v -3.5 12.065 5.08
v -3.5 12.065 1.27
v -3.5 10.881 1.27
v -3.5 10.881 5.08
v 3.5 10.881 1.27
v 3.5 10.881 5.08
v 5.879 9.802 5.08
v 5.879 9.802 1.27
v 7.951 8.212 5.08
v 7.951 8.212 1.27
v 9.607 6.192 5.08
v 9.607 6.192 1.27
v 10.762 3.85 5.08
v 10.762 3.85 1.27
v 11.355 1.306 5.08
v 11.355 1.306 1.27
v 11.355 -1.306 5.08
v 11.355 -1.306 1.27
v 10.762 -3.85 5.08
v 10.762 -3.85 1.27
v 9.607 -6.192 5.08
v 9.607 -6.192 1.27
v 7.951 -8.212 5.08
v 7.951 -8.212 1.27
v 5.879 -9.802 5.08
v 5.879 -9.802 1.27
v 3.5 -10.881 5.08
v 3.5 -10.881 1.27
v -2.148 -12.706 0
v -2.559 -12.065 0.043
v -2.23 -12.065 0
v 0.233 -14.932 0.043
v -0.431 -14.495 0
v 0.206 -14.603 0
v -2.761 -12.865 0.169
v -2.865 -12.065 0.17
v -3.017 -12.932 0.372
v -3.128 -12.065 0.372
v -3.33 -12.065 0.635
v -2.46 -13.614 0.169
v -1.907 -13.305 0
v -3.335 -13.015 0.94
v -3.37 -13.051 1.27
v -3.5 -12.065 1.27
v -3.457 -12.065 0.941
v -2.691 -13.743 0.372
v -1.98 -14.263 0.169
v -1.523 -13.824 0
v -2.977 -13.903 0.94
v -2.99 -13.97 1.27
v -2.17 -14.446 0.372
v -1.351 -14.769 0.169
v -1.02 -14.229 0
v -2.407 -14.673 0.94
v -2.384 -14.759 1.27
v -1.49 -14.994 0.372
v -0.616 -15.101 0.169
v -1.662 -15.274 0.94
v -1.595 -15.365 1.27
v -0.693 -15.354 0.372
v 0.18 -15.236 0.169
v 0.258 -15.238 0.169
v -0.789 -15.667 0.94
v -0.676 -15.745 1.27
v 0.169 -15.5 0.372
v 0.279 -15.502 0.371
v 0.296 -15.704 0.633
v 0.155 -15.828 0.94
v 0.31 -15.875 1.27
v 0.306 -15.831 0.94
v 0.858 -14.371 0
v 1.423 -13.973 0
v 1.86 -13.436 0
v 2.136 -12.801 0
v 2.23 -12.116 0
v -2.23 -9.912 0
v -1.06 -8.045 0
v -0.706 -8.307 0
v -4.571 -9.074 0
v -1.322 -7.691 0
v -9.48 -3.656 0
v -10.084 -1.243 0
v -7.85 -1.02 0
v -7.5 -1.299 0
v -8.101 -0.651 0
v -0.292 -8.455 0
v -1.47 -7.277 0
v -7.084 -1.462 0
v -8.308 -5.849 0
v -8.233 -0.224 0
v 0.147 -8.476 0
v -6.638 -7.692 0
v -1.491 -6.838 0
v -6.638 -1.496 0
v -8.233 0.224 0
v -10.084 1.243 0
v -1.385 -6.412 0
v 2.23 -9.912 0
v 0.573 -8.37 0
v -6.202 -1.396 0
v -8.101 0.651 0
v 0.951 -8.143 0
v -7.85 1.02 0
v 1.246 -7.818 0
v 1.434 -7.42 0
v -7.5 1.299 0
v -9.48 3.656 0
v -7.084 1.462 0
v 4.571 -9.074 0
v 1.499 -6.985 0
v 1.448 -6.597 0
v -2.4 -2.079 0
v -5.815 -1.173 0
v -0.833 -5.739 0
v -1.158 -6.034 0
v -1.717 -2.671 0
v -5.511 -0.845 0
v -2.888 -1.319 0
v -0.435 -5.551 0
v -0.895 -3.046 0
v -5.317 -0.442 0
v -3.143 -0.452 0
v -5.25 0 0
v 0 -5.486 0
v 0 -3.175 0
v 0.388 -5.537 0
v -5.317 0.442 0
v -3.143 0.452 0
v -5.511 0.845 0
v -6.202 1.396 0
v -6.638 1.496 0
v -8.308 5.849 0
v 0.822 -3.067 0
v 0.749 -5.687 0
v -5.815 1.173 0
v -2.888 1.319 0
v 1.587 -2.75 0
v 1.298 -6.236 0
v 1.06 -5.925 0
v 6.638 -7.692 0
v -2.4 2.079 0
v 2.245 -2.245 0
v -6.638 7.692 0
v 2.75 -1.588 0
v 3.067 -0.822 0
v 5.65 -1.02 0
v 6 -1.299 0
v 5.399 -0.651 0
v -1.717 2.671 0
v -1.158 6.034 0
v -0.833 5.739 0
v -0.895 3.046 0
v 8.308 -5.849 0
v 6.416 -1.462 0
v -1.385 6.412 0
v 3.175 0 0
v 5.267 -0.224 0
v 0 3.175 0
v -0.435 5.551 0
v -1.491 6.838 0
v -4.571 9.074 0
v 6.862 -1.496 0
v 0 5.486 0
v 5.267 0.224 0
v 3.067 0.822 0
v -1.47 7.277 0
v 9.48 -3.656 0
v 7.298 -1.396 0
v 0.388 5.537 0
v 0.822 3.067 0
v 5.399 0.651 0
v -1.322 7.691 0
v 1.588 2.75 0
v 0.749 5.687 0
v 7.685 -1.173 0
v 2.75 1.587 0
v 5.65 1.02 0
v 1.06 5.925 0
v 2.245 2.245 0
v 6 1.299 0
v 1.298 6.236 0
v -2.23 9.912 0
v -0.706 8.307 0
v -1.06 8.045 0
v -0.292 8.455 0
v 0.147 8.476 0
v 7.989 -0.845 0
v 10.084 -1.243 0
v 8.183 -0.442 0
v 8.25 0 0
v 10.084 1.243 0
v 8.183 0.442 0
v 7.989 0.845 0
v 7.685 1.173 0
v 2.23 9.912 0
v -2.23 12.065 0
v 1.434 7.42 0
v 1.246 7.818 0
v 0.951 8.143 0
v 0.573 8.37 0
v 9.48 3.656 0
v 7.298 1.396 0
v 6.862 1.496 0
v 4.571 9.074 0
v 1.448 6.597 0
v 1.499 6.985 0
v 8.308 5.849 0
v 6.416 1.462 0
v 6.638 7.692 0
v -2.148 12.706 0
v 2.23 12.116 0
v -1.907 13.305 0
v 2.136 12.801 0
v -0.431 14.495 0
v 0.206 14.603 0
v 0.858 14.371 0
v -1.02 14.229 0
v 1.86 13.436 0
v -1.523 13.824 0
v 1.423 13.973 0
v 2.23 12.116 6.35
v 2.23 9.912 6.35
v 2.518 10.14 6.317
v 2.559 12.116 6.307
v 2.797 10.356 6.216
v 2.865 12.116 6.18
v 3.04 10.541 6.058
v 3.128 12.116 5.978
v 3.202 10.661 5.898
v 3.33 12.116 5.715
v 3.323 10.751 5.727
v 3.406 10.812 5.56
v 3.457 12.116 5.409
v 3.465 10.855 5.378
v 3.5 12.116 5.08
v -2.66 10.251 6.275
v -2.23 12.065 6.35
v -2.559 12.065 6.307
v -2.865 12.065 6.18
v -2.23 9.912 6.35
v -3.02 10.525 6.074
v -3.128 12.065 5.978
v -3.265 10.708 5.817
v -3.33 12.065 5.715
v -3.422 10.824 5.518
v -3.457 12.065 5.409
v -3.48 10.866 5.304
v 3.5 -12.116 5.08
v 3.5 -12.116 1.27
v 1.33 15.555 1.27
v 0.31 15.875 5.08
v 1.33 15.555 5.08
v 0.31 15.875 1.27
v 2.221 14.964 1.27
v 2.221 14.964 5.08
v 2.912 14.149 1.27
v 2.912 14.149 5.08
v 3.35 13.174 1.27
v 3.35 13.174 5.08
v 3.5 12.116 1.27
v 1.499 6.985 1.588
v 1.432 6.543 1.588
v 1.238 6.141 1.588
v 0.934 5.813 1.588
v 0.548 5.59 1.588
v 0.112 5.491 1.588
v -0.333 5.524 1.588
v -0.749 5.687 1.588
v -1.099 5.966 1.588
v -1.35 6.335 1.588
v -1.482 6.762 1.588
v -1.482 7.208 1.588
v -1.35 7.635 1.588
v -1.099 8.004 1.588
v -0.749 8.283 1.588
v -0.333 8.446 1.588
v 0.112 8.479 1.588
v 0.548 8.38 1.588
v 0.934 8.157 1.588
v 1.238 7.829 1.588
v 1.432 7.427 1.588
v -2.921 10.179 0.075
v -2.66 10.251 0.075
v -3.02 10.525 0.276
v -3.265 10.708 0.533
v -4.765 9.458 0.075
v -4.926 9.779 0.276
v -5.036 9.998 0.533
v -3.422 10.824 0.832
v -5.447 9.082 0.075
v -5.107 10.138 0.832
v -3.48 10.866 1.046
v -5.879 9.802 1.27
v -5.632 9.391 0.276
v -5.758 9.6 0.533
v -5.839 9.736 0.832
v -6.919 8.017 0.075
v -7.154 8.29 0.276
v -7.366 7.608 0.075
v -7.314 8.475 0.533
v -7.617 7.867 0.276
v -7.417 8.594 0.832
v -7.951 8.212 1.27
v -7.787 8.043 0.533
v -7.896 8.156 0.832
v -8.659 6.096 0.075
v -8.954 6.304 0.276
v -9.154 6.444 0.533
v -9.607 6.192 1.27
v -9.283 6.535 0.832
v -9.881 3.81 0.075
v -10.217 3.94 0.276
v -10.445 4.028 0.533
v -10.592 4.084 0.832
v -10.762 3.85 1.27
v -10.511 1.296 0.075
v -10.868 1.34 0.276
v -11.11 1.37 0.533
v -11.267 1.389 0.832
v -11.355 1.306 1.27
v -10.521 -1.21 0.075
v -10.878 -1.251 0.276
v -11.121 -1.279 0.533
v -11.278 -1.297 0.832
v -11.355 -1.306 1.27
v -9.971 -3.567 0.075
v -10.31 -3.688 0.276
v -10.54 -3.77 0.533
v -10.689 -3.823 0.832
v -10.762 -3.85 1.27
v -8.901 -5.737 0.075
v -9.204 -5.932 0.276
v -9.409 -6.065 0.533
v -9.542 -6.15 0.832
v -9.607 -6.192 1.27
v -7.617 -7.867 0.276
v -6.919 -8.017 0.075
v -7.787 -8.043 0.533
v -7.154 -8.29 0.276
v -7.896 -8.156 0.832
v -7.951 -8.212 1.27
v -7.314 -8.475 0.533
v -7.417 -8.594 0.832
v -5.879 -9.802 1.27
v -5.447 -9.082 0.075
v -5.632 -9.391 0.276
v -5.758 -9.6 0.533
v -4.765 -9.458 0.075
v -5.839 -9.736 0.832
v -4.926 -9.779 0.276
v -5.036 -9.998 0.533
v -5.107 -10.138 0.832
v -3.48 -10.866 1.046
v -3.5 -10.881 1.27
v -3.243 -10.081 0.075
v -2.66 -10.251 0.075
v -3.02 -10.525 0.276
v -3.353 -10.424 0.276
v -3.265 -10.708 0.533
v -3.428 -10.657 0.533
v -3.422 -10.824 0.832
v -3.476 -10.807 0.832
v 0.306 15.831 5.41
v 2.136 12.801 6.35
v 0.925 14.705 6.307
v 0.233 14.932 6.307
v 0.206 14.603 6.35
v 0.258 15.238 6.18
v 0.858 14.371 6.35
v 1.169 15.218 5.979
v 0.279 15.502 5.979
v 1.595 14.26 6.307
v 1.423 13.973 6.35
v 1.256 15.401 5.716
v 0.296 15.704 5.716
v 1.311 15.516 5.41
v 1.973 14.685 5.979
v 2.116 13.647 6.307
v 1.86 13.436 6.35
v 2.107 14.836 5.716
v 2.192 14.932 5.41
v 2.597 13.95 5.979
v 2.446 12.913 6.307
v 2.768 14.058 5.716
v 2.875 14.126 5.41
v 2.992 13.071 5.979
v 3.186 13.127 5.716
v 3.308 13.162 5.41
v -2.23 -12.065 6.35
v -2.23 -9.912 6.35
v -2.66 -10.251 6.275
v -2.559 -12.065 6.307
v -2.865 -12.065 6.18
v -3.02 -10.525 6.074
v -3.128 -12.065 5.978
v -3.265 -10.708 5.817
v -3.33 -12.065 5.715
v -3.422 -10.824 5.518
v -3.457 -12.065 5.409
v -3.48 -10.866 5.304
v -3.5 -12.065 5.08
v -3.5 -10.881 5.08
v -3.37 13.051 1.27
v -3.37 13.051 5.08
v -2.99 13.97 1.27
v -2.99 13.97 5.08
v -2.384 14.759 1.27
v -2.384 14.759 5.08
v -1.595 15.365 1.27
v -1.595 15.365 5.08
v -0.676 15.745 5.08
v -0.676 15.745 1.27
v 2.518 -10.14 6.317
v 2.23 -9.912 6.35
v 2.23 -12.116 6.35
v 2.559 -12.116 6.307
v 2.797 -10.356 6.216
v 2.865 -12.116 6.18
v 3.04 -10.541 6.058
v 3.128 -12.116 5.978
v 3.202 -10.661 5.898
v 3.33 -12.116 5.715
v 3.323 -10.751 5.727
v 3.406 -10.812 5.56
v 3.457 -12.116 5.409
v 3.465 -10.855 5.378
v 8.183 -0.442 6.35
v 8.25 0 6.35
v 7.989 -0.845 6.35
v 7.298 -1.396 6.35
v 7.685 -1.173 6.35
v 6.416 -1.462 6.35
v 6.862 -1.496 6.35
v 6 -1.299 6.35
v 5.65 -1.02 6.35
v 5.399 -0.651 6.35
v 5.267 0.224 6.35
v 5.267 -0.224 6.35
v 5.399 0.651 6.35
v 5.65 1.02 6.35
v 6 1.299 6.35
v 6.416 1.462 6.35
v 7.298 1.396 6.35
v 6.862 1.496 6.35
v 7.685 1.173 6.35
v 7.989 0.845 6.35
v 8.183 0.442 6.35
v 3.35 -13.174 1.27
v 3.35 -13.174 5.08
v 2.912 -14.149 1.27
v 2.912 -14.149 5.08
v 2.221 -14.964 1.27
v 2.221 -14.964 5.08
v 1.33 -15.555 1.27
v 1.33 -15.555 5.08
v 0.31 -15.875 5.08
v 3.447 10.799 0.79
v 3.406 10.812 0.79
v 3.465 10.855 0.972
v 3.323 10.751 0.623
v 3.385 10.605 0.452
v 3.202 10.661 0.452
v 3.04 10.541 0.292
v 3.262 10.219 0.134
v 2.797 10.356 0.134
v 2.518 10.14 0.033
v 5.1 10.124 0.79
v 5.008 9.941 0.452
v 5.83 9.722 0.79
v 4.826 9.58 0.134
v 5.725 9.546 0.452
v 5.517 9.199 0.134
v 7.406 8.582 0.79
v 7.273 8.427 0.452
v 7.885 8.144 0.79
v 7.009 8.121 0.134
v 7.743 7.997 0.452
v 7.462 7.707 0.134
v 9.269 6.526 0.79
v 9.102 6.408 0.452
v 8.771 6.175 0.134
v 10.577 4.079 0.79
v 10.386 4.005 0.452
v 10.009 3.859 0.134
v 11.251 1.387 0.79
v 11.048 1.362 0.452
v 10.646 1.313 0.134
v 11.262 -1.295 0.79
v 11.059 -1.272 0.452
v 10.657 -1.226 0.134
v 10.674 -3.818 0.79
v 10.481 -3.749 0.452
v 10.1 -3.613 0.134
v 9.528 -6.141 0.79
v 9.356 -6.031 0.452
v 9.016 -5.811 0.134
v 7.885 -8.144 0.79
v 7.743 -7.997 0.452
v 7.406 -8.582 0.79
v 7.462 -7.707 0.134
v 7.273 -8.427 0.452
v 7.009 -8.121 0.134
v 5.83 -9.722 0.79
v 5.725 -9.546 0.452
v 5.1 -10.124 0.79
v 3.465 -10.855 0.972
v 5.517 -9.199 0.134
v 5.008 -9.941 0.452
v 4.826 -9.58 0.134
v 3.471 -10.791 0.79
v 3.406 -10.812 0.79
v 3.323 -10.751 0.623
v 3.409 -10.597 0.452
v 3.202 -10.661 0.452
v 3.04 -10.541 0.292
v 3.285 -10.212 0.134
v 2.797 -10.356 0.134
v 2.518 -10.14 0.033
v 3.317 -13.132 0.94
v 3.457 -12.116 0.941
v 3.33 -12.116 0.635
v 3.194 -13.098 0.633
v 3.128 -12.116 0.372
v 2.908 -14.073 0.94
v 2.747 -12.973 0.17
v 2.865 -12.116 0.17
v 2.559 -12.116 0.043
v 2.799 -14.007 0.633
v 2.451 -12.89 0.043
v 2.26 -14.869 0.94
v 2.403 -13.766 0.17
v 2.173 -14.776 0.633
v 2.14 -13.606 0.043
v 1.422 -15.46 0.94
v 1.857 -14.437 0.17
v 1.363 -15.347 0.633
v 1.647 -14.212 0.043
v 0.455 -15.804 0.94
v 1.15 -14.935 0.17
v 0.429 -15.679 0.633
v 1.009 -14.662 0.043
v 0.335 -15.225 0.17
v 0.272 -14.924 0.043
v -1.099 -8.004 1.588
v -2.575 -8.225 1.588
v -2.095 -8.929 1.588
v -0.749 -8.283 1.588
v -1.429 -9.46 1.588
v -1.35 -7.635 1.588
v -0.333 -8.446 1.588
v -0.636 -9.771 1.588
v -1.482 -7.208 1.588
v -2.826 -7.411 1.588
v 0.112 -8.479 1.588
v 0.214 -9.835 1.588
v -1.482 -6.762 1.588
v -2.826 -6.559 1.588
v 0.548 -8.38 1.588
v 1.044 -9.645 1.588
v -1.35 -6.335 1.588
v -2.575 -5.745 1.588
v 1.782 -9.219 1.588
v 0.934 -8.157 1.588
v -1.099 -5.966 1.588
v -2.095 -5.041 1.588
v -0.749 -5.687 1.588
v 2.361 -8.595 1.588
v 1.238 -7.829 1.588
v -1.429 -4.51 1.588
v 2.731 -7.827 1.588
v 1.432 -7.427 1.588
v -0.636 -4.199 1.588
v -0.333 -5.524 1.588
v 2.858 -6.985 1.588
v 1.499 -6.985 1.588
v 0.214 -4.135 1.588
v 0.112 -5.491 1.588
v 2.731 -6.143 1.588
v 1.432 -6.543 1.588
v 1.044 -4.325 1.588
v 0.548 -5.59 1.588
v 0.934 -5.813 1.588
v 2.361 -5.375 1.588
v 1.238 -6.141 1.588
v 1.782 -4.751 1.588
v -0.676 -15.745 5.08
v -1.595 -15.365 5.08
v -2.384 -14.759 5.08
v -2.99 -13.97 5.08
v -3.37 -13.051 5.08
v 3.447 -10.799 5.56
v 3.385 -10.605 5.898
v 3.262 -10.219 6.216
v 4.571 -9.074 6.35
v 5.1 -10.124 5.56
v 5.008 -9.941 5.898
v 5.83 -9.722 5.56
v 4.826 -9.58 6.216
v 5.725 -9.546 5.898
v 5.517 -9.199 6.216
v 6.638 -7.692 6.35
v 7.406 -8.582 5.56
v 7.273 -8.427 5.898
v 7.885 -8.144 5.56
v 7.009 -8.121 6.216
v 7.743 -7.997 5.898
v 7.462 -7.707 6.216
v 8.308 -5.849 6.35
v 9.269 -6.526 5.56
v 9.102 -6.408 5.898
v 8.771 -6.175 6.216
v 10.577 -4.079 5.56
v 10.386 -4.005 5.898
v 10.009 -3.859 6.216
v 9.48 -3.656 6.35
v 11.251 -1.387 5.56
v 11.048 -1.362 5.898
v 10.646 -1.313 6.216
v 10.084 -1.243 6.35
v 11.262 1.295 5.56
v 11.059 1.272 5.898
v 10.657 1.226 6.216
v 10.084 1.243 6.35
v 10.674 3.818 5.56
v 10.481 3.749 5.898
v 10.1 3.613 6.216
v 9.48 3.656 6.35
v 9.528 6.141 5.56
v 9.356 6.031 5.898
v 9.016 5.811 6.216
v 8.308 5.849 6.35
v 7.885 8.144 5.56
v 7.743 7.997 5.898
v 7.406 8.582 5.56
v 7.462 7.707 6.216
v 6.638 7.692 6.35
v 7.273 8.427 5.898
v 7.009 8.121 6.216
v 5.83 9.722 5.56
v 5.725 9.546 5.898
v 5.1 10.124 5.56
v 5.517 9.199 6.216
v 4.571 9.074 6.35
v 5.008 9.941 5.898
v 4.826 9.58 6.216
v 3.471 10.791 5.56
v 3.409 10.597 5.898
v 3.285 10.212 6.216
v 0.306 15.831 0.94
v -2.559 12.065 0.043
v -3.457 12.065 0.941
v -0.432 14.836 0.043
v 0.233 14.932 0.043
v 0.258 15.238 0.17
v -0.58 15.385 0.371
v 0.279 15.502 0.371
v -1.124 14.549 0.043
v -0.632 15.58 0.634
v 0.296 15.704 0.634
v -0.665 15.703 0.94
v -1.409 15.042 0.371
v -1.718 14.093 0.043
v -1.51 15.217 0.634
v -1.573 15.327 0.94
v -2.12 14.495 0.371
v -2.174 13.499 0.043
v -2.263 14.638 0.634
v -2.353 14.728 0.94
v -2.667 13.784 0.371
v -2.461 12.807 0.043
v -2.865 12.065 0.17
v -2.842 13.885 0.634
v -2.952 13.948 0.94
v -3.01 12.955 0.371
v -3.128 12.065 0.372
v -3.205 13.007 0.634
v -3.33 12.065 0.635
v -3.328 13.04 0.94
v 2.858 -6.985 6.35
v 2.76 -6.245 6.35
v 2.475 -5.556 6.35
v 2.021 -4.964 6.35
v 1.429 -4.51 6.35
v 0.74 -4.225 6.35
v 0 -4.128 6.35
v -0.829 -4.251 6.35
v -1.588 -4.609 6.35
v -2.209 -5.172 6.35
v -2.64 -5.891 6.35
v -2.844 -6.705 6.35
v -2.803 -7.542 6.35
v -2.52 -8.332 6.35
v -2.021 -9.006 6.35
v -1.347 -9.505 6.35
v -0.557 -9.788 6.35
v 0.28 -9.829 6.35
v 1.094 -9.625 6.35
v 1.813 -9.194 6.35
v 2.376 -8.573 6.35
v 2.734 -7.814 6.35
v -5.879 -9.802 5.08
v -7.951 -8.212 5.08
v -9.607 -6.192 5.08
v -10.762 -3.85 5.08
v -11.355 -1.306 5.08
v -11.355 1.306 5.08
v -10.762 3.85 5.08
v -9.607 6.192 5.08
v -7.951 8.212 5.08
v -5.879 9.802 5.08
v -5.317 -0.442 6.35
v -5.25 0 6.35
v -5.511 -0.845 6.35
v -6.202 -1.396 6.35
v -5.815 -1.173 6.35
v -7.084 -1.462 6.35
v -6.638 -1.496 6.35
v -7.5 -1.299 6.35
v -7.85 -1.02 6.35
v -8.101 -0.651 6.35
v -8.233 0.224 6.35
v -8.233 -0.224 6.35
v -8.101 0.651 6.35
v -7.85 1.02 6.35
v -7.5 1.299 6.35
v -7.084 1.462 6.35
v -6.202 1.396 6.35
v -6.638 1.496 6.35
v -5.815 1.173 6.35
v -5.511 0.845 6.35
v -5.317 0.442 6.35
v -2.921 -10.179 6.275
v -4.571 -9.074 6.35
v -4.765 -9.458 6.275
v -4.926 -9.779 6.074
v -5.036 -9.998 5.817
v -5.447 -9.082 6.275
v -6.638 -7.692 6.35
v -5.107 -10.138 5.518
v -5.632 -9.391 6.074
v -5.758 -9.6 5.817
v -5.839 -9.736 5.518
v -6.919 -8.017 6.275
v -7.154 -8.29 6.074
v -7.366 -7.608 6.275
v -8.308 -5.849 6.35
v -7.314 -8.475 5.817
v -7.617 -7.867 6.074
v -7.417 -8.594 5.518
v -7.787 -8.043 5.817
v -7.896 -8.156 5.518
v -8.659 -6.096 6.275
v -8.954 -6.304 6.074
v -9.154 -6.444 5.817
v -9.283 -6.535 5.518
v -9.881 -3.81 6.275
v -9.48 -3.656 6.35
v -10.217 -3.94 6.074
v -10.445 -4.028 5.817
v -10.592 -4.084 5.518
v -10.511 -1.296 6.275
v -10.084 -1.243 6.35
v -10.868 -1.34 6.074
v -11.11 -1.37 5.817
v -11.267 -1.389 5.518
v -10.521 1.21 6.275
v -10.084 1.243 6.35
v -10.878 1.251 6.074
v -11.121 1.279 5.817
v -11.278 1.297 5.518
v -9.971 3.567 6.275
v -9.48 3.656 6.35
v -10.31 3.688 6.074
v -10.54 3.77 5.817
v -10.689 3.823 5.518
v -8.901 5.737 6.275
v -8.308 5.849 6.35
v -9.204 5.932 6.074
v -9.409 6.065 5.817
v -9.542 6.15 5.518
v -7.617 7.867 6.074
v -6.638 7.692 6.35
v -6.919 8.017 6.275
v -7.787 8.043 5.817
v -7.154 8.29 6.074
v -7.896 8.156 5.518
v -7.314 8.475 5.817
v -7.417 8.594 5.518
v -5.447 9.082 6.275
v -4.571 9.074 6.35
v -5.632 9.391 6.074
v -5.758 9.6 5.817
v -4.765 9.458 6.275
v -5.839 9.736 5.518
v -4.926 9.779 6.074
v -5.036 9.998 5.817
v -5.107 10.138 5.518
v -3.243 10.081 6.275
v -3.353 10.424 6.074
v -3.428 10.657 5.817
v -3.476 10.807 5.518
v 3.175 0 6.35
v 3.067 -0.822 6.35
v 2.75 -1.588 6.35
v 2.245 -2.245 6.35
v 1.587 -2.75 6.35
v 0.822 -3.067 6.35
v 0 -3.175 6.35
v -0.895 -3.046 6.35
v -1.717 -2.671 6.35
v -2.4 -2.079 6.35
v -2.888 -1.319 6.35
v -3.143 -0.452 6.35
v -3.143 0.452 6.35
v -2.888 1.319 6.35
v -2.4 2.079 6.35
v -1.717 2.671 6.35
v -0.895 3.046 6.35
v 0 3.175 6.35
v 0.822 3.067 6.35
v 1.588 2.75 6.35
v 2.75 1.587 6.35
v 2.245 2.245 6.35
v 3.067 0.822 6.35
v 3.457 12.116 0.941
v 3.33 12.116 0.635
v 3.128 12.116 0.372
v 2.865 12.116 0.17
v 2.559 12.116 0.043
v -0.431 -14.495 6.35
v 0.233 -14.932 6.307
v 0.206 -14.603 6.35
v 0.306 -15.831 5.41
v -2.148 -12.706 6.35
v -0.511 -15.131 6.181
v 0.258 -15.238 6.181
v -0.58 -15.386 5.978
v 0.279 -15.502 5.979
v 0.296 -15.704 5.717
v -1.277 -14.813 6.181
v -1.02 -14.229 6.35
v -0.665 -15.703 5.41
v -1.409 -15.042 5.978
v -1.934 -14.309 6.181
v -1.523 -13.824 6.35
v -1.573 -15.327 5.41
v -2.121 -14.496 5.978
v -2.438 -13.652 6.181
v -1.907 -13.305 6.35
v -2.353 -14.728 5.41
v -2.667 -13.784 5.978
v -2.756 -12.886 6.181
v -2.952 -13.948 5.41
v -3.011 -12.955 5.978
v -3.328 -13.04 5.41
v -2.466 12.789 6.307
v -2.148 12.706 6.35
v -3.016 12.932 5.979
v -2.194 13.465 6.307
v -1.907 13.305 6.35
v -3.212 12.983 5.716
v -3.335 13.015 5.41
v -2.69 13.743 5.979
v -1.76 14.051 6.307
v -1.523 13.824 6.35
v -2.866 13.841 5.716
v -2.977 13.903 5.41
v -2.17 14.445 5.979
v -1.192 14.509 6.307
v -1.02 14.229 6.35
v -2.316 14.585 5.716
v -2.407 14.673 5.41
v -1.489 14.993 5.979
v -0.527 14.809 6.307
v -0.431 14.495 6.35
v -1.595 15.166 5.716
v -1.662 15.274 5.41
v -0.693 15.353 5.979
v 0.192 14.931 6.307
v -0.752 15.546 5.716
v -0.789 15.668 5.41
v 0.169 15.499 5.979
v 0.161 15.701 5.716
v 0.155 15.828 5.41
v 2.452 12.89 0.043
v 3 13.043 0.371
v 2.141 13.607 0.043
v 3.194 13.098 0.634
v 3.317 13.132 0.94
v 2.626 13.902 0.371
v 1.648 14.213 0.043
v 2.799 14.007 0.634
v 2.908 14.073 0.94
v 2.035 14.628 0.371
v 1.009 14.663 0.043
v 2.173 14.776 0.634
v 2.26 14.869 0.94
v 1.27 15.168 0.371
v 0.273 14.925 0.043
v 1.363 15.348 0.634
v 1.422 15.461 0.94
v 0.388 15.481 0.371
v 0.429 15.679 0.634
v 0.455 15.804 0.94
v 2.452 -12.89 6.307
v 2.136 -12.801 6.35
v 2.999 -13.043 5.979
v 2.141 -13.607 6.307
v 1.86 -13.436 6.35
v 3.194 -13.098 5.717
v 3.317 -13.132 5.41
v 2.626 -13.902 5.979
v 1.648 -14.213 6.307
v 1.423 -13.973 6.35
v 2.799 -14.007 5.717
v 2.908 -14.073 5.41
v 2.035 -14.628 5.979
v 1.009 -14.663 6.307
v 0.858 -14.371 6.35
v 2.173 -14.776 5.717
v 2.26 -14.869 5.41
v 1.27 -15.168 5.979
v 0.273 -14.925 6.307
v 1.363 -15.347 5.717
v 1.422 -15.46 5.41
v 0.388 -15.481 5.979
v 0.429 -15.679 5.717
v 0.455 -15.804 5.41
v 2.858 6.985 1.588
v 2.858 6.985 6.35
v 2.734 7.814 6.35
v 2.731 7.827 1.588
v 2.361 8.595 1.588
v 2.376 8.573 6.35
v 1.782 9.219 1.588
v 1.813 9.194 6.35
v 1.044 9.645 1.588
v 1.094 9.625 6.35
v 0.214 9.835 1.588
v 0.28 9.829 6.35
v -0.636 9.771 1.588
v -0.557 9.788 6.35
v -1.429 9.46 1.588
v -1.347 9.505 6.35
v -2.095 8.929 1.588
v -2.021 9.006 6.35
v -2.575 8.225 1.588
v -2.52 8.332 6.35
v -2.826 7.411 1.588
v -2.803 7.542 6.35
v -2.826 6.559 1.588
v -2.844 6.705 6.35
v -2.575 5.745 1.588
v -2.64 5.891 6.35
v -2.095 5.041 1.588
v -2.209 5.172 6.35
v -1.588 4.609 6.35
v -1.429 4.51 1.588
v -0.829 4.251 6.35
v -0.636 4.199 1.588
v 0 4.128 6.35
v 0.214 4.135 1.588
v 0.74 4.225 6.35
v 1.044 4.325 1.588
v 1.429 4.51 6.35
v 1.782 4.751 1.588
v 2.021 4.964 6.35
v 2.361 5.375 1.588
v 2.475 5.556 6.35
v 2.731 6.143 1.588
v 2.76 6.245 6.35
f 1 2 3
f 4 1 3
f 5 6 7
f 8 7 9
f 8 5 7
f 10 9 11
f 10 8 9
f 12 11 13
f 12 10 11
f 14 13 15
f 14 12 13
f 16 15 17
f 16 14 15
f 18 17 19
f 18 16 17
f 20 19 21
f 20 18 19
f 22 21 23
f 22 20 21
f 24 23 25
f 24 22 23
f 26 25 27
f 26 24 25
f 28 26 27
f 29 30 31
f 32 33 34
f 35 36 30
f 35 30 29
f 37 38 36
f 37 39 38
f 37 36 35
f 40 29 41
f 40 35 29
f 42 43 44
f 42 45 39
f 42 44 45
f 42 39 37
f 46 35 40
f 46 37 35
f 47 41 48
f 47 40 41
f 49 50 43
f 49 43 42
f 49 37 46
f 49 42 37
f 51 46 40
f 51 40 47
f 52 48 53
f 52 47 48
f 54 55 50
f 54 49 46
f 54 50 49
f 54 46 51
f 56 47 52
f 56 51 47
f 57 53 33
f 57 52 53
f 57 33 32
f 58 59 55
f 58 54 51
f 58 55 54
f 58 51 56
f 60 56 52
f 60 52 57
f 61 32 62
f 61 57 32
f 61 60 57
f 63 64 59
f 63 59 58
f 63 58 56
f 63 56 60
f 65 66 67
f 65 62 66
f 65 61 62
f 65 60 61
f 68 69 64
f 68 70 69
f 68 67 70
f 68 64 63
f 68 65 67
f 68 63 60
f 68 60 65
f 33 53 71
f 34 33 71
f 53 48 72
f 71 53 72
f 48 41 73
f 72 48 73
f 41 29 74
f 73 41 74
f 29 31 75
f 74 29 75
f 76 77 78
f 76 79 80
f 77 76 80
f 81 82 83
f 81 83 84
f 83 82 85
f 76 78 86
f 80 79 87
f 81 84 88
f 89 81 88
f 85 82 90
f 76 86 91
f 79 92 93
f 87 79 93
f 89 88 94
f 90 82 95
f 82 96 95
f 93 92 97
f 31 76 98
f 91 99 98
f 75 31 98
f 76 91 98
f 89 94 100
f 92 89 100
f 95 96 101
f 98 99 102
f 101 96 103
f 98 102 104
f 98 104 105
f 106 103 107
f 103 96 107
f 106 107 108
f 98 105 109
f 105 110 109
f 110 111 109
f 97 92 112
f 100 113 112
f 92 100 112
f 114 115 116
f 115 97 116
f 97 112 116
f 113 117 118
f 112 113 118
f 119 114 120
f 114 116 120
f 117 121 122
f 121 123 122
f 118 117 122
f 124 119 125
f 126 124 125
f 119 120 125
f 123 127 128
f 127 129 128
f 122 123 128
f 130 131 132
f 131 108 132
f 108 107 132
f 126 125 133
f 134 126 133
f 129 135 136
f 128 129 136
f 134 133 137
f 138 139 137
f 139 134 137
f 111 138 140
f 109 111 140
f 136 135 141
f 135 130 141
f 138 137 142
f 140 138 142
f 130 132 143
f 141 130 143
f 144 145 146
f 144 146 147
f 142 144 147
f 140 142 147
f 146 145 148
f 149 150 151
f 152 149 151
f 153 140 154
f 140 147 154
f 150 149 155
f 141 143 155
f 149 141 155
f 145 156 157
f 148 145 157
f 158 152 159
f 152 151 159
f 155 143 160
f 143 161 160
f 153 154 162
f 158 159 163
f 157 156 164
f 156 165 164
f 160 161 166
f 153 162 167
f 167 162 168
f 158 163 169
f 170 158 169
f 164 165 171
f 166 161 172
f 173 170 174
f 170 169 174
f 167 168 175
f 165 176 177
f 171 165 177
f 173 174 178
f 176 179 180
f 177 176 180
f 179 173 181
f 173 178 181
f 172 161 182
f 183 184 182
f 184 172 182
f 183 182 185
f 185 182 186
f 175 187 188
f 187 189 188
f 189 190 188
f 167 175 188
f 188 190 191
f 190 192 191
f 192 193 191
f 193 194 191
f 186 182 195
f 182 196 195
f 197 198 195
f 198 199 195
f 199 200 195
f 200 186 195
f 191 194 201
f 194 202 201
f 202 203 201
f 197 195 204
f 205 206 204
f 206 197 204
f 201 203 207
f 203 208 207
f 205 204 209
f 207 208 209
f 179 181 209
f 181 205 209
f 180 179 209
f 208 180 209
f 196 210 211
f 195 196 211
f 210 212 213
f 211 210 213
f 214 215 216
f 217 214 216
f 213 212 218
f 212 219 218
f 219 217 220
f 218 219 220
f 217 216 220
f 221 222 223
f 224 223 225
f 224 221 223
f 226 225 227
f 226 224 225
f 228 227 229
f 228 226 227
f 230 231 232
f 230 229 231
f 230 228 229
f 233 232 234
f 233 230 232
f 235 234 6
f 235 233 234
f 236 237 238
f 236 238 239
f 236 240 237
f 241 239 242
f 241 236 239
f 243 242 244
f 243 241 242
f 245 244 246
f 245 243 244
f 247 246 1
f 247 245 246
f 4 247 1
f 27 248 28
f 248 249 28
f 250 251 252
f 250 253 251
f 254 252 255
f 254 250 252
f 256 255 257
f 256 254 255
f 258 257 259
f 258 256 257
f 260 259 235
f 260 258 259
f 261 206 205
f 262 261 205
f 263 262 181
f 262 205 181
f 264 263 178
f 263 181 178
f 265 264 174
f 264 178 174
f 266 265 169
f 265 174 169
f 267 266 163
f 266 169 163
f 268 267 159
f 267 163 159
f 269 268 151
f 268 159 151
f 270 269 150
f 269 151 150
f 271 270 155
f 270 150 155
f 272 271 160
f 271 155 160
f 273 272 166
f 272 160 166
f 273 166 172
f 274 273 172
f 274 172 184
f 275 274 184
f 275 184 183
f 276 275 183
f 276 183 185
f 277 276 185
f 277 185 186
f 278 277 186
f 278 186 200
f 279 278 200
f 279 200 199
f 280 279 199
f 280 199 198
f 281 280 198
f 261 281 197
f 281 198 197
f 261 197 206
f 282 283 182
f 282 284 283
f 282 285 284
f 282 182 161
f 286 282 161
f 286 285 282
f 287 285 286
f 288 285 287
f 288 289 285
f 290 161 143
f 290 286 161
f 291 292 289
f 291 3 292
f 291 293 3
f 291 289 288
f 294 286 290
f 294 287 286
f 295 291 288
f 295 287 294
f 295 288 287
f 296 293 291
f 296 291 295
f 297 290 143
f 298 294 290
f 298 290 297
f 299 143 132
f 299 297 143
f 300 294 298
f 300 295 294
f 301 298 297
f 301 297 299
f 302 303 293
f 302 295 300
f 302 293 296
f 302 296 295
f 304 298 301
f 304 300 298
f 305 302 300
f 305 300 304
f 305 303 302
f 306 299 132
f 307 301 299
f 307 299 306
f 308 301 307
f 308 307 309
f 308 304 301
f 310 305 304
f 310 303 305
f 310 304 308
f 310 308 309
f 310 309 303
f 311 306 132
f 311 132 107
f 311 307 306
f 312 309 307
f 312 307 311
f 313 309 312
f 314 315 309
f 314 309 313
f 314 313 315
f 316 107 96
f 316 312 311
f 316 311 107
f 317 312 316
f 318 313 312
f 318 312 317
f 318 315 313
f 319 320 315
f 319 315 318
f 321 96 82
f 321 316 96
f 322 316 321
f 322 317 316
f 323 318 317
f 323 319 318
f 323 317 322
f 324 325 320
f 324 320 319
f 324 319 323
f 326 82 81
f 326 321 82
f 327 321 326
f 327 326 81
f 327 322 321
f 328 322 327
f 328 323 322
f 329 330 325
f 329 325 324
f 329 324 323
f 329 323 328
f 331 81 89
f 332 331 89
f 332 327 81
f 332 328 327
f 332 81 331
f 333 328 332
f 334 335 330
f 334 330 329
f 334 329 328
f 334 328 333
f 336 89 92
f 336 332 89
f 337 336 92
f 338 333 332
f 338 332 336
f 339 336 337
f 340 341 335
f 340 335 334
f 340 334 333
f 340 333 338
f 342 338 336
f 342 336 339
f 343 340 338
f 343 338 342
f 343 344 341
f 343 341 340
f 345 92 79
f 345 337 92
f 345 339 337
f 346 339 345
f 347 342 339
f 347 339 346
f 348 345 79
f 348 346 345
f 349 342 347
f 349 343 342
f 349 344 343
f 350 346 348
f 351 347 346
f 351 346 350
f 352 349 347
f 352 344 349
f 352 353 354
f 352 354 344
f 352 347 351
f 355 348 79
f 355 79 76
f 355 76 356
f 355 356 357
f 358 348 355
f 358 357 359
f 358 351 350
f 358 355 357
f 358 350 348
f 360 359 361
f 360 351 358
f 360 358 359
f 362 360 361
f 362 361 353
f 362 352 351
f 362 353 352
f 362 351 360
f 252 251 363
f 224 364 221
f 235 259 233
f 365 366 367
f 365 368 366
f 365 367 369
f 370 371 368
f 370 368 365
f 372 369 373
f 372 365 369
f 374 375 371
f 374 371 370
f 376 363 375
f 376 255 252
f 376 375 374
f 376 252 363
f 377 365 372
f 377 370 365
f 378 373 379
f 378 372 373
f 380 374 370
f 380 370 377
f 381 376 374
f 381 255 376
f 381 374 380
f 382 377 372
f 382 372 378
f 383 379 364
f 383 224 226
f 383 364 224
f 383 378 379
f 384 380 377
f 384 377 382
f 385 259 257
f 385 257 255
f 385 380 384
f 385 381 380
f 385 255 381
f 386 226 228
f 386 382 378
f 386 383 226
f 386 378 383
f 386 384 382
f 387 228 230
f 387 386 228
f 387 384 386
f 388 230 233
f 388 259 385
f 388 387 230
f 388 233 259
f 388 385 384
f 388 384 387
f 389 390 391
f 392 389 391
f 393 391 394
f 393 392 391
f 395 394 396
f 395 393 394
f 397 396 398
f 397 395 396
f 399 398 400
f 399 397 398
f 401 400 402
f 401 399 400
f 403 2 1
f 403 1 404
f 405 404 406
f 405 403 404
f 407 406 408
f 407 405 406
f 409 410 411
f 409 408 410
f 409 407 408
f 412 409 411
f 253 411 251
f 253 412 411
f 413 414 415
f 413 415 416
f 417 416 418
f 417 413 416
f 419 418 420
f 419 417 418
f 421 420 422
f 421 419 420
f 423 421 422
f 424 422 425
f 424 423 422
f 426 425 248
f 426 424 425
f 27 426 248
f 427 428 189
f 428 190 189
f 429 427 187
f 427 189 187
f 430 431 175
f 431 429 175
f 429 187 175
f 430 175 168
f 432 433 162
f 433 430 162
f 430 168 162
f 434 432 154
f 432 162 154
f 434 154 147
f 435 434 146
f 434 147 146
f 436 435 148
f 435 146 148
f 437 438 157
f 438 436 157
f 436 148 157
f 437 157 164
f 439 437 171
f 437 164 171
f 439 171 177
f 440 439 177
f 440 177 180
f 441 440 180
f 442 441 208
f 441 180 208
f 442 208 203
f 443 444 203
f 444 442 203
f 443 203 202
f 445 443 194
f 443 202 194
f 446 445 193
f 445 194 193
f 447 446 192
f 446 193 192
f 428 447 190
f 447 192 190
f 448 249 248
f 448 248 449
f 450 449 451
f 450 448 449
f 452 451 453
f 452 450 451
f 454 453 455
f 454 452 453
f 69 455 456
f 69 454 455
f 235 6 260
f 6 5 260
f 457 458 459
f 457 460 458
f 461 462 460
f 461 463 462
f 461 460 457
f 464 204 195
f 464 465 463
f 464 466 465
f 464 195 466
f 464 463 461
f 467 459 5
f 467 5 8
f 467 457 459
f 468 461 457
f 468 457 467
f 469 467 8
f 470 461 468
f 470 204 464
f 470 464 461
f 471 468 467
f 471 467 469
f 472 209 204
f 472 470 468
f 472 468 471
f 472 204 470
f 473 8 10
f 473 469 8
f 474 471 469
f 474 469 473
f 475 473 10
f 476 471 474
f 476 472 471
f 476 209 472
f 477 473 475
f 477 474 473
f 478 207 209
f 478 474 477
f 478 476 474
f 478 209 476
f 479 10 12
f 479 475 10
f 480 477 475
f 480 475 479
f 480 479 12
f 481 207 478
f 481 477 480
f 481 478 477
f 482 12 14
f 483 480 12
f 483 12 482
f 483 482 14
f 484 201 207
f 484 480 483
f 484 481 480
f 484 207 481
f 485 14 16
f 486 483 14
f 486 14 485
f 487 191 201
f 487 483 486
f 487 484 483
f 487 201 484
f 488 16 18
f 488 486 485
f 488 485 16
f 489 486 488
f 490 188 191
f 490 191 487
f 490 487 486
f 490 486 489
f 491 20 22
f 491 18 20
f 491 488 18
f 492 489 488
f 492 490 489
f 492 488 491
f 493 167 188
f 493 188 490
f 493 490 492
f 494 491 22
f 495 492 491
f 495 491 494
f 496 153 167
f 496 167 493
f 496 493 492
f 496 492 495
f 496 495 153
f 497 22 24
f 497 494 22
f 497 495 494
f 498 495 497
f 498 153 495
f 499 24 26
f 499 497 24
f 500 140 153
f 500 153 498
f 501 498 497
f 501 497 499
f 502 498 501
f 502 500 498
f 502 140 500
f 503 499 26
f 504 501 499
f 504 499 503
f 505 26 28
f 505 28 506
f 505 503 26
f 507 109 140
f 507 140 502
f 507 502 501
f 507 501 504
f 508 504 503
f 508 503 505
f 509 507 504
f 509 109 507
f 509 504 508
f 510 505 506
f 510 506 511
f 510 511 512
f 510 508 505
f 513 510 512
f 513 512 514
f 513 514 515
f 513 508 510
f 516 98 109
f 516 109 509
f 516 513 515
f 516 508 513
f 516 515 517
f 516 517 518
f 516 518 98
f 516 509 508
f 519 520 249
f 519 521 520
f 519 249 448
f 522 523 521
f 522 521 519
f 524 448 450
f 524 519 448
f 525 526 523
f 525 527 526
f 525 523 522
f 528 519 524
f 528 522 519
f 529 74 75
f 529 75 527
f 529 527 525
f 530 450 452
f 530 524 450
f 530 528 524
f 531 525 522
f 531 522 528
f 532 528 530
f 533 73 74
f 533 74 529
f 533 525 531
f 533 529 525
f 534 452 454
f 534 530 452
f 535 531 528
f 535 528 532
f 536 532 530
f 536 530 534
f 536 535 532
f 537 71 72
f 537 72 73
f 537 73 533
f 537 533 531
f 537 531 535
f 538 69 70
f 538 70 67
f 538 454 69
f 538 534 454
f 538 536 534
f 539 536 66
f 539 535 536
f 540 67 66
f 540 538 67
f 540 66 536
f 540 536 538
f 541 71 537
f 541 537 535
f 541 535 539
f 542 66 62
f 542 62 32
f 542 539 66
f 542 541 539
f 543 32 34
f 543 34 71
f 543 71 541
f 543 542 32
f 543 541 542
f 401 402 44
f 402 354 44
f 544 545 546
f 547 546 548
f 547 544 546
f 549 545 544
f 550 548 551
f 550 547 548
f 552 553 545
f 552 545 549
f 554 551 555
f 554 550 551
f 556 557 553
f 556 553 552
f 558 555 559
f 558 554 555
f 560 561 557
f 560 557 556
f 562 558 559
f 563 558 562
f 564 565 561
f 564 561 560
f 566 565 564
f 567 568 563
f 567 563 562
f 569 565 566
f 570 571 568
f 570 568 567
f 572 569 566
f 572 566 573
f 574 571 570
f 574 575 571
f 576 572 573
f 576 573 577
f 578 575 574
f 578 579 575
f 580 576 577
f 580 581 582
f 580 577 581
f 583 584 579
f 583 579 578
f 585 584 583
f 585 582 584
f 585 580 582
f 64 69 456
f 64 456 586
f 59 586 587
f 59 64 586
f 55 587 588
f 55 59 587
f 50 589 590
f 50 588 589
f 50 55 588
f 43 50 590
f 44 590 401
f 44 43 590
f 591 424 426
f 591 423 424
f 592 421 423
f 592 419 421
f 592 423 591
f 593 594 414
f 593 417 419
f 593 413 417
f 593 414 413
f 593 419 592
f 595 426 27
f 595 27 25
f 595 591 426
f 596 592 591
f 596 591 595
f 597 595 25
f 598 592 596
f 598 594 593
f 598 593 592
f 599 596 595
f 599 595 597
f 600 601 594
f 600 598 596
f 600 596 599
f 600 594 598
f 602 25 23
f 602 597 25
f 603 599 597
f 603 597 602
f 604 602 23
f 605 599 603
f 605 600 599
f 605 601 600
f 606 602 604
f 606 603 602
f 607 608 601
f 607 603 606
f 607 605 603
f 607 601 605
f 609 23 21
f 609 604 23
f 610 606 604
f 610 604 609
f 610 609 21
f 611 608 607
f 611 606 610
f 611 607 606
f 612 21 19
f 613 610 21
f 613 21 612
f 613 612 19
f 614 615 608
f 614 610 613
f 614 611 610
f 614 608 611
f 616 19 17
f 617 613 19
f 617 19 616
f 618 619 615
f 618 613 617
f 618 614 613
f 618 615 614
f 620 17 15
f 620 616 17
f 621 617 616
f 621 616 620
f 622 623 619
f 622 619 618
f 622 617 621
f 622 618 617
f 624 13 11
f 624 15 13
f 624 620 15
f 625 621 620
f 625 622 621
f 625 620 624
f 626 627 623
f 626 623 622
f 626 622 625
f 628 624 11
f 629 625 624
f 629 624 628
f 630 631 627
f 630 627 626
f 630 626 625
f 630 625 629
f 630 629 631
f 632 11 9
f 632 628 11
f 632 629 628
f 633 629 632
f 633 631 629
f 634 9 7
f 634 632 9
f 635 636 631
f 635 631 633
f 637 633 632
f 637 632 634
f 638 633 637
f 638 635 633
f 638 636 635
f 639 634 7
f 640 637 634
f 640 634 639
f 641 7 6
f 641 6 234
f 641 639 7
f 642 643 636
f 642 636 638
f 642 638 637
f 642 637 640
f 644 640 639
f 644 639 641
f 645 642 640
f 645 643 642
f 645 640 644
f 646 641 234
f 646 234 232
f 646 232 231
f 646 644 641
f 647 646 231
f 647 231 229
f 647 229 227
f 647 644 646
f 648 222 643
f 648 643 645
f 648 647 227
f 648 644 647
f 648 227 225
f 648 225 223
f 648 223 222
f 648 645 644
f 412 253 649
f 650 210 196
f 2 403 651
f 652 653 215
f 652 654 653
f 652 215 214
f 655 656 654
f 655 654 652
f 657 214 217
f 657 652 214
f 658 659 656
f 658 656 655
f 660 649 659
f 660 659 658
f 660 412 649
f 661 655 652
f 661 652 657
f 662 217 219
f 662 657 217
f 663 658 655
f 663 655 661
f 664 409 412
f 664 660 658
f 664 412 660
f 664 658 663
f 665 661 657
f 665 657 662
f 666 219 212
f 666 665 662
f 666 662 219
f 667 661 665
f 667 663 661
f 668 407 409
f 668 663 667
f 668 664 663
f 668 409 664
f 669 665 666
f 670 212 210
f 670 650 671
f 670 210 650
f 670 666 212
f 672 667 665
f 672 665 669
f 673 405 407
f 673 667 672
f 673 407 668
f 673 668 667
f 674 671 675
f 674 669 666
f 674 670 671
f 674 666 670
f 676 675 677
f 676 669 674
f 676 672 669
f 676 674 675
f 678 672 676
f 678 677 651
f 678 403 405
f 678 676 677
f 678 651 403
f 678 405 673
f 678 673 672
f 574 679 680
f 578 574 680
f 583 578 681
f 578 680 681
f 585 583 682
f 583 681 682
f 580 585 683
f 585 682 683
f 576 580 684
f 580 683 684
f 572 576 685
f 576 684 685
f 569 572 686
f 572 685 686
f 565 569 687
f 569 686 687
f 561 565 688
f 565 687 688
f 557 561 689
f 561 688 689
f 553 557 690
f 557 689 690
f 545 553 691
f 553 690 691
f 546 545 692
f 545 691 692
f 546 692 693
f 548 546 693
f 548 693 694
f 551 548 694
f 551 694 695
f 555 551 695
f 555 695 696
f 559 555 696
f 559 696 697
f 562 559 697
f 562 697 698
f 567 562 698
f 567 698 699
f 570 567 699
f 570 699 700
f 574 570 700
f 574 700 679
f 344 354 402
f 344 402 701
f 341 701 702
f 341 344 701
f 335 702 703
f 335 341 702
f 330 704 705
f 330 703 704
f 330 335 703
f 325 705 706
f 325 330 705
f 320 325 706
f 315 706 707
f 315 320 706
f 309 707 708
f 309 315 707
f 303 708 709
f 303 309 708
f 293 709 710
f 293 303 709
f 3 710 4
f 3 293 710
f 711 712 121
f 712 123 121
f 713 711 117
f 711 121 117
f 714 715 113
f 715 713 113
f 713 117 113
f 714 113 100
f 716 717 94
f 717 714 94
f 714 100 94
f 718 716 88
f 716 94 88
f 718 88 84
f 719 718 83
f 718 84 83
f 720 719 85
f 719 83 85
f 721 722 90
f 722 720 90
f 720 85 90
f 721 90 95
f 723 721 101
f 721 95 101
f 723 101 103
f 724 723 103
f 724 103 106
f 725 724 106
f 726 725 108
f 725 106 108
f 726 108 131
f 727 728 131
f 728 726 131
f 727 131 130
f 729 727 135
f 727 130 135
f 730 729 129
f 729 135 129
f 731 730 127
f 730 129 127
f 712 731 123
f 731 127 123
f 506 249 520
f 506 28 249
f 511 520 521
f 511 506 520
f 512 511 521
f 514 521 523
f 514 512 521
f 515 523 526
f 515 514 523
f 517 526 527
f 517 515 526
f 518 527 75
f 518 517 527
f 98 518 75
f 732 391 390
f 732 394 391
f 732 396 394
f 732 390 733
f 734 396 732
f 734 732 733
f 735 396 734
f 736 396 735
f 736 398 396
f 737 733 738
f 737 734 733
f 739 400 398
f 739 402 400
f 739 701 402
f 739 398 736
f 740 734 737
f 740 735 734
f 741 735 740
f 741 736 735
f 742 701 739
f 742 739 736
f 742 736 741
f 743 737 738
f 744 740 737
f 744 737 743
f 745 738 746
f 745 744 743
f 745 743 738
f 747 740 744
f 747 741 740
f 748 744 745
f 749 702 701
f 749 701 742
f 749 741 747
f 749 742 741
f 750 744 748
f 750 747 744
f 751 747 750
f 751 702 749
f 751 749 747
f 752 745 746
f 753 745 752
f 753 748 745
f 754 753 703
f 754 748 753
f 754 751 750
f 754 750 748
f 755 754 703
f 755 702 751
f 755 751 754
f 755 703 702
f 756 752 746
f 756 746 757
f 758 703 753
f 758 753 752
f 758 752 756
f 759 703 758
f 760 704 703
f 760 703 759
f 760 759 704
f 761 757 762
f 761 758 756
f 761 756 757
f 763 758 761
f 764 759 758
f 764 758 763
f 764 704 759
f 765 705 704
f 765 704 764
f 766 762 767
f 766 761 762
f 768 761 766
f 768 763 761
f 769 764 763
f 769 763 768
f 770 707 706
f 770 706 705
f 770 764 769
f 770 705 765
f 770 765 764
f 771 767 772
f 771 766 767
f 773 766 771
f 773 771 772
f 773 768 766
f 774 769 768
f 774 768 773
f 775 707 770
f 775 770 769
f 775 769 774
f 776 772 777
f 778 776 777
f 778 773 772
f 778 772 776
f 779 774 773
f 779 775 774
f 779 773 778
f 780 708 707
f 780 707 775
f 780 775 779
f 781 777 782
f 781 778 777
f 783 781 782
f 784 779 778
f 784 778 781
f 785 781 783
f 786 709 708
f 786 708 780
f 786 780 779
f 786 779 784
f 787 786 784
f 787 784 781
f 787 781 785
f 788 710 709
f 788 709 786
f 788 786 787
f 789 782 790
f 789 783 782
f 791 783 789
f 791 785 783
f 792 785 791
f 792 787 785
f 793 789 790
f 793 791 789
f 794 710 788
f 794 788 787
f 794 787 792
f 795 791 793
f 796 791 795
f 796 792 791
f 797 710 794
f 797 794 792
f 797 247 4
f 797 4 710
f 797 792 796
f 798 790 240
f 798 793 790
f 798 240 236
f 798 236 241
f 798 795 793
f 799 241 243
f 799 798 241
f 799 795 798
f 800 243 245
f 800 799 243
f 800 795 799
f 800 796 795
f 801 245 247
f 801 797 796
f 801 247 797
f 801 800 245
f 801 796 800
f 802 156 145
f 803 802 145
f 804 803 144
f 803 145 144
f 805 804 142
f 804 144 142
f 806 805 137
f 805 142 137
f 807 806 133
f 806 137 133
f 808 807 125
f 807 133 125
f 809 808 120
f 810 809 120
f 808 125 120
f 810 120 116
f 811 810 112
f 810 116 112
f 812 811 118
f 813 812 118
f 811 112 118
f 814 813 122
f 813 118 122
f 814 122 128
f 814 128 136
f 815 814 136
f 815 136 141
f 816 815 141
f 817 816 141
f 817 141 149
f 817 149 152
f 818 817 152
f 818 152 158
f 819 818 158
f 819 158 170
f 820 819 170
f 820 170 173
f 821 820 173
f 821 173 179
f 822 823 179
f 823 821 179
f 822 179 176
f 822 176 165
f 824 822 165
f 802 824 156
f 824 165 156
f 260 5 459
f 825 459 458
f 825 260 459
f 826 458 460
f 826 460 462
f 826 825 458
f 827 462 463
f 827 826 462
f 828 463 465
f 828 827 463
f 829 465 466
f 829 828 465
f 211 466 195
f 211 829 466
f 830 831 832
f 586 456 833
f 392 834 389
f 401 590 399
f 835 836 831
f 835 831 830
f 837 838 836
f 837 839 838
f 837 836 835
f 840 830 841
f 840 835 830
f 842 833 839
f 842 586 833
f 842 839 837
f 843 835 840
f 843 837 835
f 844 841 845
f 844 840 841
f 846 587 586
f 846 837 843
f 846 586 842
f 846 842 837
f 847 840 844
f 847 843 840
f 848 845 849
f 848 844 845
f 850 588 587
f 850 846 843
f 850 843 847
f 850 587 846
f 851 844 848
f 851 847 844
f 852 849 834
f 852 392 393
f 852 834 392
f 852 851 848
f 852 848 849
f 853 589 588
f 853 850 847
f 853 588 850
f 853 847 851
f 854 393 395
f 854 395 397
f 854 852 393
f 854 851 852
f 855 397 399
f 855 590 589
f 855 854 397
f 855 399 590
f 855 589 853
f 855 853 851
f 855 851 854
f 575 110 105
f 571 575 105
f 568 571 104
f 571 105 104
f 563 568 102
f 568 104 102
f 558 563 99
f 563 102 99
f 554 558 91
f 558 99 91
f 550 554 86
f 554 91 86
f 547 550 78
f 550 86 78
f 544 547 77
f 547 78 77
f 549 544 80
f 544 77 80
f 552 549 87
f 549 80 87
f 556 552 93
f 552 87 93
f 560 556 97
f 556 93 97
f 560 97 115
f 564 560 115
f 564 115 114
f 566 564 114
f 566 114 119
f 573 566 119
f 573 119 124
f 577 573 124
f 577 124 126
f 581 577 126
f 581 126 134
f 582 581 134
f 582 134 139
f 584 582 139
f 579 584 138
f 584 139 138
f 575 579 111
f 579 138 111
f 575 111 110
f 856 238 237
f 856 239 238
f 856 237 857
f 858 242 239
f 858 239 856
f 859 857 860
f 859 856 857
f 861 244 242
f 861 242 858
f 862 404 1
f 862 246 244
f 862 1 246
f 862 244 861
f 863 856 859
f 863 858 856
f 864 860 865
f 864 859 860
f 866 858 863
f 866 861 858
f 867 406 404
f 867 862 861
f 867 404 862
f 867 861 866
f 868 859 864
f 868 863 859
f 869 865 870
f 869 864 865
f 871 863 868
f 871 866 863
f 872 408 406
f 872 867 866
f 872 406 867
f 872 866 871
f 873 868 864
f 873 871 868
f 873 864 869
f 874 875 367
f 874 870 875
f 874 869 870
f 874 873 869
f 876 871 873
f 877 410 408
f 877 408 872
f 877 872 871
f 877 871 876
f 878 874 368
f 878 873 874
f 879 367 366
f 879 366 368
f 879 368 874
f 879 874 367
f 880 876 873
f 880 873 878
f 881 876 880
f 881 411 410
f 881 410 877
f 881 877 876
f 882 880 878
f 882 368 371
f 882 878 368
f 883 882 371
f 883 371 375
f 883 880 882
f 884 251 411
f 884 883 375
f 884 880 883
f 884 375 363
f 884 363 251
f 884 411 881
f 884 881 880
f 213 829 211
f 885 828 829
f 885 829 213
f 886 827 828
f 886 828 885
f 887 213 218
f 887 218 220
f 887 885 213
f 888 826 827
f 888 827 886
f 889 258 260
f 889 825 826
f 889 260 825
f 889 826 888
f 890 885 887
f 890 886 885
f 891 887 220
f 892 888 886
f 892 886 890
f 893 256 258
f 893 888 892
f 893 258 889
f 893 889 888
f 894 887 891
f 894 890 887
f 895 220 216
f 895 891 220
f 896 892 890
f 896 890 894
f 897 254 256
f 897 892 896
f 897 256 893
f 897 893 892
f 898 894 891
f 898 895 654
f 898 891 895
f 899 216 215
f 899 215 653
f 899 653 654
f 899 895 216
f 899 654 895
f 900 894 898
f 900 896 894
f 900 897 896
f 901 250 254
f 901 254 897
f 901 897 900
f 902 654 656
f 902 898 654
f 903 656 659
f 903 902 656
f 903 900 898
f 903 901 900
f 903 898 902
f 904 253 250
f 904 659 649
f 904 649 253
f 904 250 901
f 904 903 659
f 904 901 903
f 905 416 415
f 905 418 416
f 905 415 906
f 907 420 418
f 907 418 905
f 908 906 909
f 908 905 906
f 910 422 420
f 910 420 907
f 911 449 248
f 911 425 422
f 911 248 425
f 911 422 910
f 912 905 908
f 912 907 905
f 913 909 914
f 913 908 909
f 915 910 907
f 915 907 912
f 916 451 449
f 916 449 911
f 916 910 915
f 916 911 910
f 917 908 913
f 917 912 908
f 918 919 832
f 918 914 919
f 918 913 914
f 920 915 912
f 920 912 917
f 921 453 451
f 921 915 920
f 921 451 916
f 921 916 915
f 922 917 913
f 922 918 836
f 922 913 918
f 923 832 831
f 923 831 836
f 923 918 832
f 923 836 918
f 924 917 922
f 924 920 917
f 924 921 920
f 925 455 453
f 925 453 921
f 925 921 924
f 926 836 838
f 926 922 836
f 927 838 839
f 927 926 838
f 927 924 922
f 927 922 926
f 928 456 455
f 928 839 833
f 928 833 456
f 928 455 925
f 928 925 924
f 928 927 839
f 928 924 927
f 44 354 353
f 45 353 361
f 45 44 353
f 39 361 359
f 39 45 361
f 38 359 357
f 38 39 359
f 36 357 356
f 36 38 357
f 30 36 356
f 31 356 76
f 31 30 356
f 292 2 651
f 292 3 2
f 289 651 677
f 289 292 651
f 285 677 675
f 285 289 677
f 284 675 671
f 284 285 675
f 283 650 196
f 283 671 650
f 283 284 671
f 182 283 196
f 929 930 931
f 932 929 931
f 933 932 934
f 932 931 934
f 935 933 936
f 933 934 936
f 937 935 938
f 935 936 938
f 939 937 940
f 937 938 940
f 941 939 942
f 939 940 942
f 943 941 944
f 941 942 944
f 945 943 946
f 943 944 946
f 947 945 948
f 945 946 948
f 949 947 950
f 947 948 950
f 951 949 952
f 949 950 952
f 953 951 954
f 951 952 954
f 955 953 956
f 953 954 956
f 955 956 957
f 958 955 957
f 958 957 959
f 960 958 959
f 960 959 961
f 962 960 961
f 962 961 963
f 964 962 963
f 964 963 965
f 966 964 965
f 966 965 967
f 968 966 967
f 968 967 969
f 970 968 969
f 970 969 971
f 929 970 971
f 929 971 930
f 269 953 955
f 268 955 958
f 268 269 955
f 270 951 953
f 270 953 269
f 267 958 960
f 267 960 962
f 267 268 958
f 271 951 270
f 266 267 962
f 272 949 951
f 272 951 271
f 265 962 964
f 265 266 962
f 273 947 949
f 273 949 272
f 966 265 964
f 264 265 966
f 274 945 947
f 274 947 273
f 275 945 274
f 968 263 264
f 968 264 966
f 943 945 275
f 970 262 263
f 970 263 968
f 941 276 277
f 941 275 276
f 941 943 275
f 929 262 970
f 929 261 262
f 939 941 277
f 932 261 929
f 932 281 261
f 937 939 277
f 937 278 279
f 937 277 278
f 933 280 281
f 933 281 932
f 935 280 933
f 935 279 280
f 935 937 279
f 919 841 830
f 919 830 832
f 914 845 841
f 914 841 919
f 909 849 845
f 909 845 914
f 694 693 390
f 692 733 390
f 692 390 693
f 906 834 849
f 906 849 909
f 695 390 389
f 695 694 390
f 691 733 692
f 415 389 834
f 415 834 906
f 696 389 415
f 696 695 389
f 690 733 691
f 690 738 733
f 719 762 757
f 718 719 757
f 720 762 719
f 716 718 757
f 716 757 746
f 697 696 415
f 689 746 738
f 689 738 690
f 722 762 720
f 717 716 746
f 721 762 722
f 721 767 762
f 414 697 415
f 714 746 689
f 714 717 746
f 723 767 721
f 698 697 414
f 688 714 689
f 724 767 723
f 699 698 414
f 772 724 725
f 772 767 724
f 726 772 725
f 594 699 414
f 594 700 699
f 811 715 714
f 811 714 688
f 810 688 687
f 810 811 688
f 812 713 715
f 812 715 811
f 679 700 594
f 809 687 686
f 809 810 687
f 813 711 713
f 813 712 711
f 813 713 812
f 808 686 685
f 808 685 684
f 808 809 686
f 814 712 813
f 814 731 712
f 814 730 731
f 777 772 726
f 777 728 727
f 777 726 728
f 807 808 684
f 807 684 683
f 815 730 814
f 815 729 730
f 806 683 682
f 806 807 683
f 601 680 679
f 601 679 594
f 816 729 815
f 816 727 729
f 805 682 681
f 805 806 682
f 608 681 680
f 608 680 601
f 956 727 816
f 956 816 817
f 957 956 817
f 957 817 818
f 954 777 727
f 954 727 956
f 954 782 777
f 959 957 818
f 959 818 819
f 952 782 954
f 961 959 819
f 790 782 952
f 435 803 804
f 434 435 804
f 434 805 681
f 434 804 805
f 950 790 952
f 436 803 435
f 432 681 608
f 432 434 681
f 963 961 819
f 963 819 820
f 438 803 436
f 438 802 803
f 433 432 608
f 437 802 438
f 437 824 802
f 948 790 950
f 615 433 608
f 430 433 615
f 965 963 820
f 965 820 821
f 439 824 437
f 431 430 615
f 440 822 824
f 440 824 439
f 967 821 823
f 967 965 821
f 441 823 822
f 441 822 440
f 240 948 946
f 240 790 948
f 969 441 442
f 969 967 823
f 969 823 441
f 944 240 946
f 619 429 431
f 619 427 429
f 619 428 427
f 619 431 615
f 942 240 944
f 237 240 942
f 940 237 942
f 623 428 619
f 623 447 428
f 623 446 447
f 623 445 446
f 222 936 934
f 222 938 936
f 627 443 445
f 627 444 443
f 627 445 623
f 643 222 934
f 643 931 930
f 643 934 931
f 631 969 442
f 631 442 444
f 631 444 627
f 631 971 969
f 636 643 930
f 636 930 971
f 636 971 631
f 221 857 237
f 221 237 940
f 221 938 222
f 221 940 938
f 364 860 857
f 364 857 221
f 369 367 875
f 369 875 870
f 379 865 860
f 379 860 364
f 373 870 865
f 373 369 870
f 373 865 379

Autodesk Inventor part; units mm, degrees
ref_plane "YZ Plane" through (0, 0, 0) normal (1, 0, 0) x (0, 1, 0)
ref_plane "XZ Plane" through (0, 0, 0) normal (0, 1, 0) x (-1, 0, 0)
ref_plane "XY Plane" through (0, 0, 0) normal (0, 0, 1) x (1, 0, 0)
sketch "Sketch1" plane through (0, 0, 0) normal (0, 0, 1) x (1, 0, 0)
  circle A0 centre (0, 0) radius 11.43
  circle A1 centre (-6.75, 0) radius 1.5
  circle A2 centre (0, 0) radius 1.5
  circle A3 centre (6.75, 0) radius 1.5
  line L0 (0, 0) -> (0, 6.985)
  line L1 (0, 0) -> (0, -6.985)
  circle A4 centre (0, 6.985) radius 1.4986
  circle A5 centre (0, -6.985) radius 1.4986
  circle A6 centre (0, 0) radius 3.175
  arc A7 (0.31, -15.875) -> (3.5, -12.1158) centre (-0.31, -12.1158) ccw
  line L2 (3.5, -12.1158) -> (3.5, 12.1158)
  arc A8 (3.5, 12.1158) -> (0.31, 15.875) centre (-0.31, 12.1158) ccw
  arc A9 (0.31, 15.875) -> (-3.5, 12.065) centre (0.31, 12.065) ccw
  line L3 (-3.5, 12.065) -> (-3.5, -12.065)
  arc A10 (-3.5, -12.065) -> (0.31, -15.875) centre (0.31, -12.065) ccw
  circle A11 centre (0, 6.985) radius 1.5
  circle A12 centre (0, -6.985) radius 1.5
  line L4 (3.5, 0) -> (-3.5, 0)
  line L5 (0, 0) -> (0, 6.985)
  point P0 (3.5, -10.8809)
  point P1 (-3.5, -10.8809)
  point P2 (-3.5, 10.8809)
  point P3 (3.5, 10.8809)
  dimension "d0" = 22.86
  dimension "d1" = 6.985
  dimension "d2" = 6.985
  dimension "d3" = 2.9972
  dimension "d4" = 2.9972
  dimension "d7" = 6.35
extrude "Extrusion1" add sketch "Sketch1" along normal blind 6.35 contours A0 L2 | L2 L4 A6 L3 A0 | A0 L3 A9 A8 L2 | L2 A7 A10 L3 A0 | A0 L3 L4 A6 L2 | L3 A0
fillet "Fillet2" radius 1.27 20 edges at (11.43, 0, 0) (11.43, 0, 6.35) (-11.43, 0, 0) (-11.43, 0, 6.35) (3.5, 11.4984, 6.35) (2.595, 14.5809, 6.35) (-3.5, 11.473, 6.35) (-2.3841, 14.7591, 6.35) (-3.5, 11.473, 0) (-2.3841, 14.7591, 0) (3.5, 11.4984, 0) (2.595, 14.5809, 0) (2.595, -14.5809, 6.35) (3.5, -11.4984, 6.35) (-3.5, -11.473, 6.35) (-2.3841, -14.7591, 6.35) (3.5, -11.4984, 0) (2.595, -14.5809, 0) (-3.5, -11.473, 0) (-2.3841, -14.7591, 0)
sketch "Sketch3" plane through (0, 0, 6.35) normal (0, 0, 1) x (1, 0, 0)
  circle A0 centre (0, 6.985) radius 1.4986 projected
  circle A1 centre (0, 6.985) radius 2.8575
  circle A2 centre (0, -6.985) radius 1.4986 projected
  circle A3 centre (0, -6.985) radius 2.8575
  point P0 (0, 0)
  dimension "d12" = 5.715
  dimension "d13" = 5.715
extrude "Extrusion2" cut sketch "Sketch3" against normal blind 4.7625
properties part number "turning_cap"
